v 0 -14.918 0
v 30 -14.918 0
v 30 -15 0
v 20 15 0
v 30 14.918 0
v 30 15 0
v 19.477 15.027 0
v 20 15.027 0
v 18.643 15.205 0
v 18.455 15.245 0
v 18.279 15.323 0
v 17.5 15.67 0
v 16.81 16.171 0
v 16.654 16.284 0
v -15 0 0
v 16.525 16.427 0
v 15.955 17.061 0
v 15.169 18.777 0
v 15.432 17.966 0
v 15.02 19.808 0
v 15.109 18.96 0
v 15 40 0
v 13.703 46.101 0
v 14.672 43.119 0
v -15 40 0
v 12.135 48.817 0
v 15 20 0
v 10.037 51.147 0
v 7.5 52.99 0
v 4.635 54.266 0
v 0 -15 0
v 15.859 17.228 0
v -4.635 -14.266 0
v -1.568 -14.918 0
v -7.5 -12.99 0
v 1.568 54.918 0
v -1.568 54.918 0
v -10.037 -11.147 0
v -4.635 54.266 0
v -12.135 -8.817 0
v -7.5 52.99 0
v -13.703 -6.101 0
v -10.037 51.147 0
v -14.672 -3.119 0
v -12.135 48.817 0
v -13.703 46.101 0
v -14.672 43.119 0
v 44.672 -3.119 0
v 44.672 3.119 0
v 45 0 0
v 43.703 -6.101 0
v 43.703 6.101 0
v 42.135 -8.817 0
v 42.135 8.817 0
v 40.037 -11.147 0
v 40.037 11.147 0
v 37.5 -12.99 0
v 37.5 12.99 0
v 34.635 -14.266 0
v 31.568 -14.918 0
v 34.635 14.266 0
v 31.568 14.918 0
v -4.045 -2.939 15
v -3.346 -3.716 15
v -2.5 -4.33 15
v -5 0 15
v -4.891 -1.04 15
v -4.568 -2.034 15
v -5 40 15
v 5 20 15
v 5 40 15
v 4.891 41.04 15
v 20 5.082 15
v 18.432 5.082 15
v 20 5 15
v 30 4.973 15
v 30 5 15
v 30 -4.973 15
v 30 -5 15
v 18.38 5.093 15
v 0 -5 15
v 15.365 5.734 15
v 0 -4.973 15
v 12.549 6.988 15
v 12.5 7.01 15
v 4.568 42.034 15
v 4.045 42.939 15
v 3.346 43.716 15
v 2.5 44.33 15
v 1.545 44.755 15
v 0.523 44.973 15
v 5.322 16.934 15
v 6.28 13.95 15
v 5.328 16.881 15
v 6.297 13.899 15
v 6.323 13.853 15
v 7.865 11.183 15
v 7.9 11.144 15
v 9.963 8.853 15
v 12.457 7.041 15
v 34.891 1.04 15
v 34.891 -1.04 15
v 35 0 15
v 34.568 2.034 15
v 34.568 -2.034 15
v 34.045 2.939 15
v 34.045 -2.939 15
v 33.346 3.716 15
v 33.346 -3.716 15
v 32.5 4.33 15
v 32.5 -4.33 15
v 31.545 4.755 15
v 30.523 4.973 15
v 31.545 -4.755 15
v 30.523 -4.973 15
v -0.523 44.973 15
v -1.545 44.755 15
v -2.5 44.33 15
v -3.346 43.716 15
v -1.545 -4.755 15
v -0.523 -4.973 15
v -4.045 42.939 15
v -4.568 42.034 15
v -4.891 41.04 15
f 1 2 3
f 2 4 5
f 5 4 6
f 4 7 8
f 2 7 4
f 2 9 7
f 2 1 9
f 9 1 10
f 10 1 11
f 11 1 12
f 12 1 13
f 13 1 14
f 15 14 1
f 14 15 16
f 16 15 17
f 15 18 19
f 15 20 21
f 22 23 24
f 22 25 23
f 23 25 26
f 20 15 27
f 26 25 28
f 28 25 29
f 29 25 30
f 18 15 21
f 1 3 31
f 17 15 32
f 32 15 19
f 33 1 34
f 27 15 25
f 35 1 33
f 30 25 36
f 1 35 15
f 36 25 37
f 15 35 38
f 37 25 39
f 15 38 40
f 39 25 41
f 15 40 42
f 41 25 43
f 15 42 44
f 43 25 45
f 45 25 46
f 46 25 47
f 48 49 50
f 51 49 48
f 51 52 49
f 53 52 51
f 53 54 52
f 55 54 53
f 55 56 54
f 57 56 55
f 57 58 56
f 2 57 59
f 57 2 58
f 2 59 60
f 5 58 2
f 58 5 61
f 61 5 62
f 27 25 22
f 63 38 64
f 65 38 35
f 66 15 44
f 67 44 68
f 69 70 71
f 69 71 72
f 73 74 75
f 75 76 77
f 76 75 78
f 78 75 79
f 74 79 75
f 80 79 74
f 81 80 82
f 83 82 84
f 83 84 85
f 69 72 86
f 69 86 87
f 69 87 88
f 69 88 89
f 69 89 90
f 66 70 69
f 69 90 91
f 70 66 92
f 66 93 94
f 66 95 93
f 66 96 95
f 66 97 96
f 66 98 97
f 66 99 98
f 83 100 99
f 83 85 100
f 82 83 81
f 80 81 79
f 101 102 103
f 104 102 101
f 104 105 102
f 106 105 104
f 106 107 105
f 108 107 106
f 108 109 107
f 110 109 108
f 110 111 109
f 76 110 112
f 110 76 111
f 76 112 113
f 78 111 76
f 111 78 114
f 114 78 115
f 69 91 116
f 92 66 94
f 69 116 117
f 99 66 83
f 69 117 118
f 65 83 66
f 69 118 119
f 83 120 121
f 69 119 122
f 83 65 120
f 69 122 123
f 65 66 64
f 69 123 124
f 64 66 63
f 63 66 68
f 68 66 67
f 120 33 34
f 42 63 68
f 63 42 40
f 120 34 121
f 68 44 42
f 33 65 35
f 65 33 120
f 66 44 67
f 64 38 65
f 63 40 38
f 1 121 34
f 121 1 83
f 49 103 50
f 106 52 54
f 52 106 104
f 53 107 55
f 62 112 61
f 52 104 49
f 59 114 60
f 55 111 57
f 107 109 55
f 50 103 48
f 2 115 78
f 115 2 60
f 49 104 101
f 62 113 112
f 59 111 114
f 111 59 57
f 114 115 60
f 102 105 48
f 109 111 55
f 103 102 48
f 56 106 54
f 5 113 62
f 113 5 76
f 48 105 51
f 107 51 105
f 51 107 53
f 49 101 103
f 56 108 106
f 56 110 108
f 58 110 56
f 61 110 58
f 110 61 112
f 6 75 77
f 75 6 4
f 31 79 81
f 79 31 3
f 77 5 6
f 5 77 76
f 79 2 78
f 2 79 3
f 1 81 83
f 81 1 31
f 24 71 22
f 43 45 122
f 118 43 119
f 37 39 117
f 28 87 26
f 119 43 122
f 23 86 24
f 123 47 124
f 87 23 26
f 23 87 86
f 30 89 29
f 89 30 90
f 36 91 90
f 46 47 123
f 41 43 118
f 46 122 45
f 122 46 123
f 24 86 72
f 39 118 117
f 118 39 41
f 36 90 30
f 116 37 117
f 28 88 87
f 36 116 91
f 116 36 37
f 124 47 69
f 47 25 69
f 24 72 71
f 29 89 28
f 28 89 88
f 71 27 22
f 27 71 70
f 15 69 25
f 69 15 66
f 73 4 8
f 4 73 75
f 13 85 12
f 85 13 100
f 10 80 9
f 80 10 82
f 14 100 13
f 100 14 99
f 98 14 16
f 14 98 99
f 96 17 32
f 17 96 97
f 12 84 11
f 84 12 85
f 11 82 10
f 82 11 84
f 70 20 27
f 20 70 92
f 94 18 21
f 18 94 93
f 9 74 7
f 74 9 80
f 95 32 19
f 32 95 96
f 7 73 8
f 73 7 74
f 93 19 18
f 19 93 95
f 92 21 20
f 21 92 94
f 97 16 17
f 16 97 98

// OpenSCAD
// file: ../lib/extended_cylinder.scad
b = 14; // bottom radius
t = 11; // top radius
h = 10; // height

// if no workey because a radius becomes negative, reduce the shift value
module extended_cylinder(h=0,r1=1,r2=1,shift=2,center=false) {
    slope = h / (r2-r1);
    // p for prime
    hp = (r1>0 && r2>0) ? h + shift : h + shift/2;
    bp = (r1>0)?r1-(1/slope)*(shift/2):0;
    tp = (r2>0)?r2+(1/slope)*(shift/2):0;
    translate([0,0,center?0:((r1>0)?-shift/2:0)])
    cylinder(hp,r1=bp,r2=tp,center=center);
}

difference(){
    cylinder(h,r=b+t,center=true);
    cylinder(h,r1=b,r2=t,center=true);
    translate([(b+t)/2,-(b+t)/2,0]) cube([b+t,b+t,h+1],center=true);
}

translate([2*(b+t)+10,0,0])
difference(){
    cylinder(h,r=b+t,center=true);
    extended_cylinder(h,b,t,0.1,true);
    translate([(b+t)/2,-(b+t)/2,0]) cube([b+t,b+t,h+1],center=true);
}
// main file
use <../lib/extended_cylinder.scad>

bot_rad = 15;
top_rad = 5;
height = 15;
c2c_x = 30;
c2c_y = 40;
slope = height / (top_rad-bot_rad);
angle = atan(slope);
echo(slope,angle);

difference() {
union() {
cylinder(h=height, r1=bot_rad,  r2=top_rad);

translate([c2c_x,0,0])
cylinder(h=height, r1=bot_rad,  r2=top_rad);

rotate([0,-90,180])
linear_extrude(c2c_x)
polygon([
    [0,-bot_rad],
    [0,bot_rad],
    [height,top_rad],
    [height,-top_rad]
]);

translate([0,c2c_y,0])
cylinder(h=height, r1=bot_rad,  r2=top_rad);

rotate([0,-90,-90])
linear_extrude(c2c_y)
polygon([
    [0,-bot_rad],
    [0,bot_rad],
    [height,top_rad],
    [height,-top_rad]
]);

cube([
    bot_rad+top_rad,
    bot_rad+top_rad,
    height
]);
}
translate([
    (bot_rad+top_rad),
    (bot_rad+top_rad),
    0
])
extended_cylinder(h=height, r1=top_rad, r2=bot_rad);
}
